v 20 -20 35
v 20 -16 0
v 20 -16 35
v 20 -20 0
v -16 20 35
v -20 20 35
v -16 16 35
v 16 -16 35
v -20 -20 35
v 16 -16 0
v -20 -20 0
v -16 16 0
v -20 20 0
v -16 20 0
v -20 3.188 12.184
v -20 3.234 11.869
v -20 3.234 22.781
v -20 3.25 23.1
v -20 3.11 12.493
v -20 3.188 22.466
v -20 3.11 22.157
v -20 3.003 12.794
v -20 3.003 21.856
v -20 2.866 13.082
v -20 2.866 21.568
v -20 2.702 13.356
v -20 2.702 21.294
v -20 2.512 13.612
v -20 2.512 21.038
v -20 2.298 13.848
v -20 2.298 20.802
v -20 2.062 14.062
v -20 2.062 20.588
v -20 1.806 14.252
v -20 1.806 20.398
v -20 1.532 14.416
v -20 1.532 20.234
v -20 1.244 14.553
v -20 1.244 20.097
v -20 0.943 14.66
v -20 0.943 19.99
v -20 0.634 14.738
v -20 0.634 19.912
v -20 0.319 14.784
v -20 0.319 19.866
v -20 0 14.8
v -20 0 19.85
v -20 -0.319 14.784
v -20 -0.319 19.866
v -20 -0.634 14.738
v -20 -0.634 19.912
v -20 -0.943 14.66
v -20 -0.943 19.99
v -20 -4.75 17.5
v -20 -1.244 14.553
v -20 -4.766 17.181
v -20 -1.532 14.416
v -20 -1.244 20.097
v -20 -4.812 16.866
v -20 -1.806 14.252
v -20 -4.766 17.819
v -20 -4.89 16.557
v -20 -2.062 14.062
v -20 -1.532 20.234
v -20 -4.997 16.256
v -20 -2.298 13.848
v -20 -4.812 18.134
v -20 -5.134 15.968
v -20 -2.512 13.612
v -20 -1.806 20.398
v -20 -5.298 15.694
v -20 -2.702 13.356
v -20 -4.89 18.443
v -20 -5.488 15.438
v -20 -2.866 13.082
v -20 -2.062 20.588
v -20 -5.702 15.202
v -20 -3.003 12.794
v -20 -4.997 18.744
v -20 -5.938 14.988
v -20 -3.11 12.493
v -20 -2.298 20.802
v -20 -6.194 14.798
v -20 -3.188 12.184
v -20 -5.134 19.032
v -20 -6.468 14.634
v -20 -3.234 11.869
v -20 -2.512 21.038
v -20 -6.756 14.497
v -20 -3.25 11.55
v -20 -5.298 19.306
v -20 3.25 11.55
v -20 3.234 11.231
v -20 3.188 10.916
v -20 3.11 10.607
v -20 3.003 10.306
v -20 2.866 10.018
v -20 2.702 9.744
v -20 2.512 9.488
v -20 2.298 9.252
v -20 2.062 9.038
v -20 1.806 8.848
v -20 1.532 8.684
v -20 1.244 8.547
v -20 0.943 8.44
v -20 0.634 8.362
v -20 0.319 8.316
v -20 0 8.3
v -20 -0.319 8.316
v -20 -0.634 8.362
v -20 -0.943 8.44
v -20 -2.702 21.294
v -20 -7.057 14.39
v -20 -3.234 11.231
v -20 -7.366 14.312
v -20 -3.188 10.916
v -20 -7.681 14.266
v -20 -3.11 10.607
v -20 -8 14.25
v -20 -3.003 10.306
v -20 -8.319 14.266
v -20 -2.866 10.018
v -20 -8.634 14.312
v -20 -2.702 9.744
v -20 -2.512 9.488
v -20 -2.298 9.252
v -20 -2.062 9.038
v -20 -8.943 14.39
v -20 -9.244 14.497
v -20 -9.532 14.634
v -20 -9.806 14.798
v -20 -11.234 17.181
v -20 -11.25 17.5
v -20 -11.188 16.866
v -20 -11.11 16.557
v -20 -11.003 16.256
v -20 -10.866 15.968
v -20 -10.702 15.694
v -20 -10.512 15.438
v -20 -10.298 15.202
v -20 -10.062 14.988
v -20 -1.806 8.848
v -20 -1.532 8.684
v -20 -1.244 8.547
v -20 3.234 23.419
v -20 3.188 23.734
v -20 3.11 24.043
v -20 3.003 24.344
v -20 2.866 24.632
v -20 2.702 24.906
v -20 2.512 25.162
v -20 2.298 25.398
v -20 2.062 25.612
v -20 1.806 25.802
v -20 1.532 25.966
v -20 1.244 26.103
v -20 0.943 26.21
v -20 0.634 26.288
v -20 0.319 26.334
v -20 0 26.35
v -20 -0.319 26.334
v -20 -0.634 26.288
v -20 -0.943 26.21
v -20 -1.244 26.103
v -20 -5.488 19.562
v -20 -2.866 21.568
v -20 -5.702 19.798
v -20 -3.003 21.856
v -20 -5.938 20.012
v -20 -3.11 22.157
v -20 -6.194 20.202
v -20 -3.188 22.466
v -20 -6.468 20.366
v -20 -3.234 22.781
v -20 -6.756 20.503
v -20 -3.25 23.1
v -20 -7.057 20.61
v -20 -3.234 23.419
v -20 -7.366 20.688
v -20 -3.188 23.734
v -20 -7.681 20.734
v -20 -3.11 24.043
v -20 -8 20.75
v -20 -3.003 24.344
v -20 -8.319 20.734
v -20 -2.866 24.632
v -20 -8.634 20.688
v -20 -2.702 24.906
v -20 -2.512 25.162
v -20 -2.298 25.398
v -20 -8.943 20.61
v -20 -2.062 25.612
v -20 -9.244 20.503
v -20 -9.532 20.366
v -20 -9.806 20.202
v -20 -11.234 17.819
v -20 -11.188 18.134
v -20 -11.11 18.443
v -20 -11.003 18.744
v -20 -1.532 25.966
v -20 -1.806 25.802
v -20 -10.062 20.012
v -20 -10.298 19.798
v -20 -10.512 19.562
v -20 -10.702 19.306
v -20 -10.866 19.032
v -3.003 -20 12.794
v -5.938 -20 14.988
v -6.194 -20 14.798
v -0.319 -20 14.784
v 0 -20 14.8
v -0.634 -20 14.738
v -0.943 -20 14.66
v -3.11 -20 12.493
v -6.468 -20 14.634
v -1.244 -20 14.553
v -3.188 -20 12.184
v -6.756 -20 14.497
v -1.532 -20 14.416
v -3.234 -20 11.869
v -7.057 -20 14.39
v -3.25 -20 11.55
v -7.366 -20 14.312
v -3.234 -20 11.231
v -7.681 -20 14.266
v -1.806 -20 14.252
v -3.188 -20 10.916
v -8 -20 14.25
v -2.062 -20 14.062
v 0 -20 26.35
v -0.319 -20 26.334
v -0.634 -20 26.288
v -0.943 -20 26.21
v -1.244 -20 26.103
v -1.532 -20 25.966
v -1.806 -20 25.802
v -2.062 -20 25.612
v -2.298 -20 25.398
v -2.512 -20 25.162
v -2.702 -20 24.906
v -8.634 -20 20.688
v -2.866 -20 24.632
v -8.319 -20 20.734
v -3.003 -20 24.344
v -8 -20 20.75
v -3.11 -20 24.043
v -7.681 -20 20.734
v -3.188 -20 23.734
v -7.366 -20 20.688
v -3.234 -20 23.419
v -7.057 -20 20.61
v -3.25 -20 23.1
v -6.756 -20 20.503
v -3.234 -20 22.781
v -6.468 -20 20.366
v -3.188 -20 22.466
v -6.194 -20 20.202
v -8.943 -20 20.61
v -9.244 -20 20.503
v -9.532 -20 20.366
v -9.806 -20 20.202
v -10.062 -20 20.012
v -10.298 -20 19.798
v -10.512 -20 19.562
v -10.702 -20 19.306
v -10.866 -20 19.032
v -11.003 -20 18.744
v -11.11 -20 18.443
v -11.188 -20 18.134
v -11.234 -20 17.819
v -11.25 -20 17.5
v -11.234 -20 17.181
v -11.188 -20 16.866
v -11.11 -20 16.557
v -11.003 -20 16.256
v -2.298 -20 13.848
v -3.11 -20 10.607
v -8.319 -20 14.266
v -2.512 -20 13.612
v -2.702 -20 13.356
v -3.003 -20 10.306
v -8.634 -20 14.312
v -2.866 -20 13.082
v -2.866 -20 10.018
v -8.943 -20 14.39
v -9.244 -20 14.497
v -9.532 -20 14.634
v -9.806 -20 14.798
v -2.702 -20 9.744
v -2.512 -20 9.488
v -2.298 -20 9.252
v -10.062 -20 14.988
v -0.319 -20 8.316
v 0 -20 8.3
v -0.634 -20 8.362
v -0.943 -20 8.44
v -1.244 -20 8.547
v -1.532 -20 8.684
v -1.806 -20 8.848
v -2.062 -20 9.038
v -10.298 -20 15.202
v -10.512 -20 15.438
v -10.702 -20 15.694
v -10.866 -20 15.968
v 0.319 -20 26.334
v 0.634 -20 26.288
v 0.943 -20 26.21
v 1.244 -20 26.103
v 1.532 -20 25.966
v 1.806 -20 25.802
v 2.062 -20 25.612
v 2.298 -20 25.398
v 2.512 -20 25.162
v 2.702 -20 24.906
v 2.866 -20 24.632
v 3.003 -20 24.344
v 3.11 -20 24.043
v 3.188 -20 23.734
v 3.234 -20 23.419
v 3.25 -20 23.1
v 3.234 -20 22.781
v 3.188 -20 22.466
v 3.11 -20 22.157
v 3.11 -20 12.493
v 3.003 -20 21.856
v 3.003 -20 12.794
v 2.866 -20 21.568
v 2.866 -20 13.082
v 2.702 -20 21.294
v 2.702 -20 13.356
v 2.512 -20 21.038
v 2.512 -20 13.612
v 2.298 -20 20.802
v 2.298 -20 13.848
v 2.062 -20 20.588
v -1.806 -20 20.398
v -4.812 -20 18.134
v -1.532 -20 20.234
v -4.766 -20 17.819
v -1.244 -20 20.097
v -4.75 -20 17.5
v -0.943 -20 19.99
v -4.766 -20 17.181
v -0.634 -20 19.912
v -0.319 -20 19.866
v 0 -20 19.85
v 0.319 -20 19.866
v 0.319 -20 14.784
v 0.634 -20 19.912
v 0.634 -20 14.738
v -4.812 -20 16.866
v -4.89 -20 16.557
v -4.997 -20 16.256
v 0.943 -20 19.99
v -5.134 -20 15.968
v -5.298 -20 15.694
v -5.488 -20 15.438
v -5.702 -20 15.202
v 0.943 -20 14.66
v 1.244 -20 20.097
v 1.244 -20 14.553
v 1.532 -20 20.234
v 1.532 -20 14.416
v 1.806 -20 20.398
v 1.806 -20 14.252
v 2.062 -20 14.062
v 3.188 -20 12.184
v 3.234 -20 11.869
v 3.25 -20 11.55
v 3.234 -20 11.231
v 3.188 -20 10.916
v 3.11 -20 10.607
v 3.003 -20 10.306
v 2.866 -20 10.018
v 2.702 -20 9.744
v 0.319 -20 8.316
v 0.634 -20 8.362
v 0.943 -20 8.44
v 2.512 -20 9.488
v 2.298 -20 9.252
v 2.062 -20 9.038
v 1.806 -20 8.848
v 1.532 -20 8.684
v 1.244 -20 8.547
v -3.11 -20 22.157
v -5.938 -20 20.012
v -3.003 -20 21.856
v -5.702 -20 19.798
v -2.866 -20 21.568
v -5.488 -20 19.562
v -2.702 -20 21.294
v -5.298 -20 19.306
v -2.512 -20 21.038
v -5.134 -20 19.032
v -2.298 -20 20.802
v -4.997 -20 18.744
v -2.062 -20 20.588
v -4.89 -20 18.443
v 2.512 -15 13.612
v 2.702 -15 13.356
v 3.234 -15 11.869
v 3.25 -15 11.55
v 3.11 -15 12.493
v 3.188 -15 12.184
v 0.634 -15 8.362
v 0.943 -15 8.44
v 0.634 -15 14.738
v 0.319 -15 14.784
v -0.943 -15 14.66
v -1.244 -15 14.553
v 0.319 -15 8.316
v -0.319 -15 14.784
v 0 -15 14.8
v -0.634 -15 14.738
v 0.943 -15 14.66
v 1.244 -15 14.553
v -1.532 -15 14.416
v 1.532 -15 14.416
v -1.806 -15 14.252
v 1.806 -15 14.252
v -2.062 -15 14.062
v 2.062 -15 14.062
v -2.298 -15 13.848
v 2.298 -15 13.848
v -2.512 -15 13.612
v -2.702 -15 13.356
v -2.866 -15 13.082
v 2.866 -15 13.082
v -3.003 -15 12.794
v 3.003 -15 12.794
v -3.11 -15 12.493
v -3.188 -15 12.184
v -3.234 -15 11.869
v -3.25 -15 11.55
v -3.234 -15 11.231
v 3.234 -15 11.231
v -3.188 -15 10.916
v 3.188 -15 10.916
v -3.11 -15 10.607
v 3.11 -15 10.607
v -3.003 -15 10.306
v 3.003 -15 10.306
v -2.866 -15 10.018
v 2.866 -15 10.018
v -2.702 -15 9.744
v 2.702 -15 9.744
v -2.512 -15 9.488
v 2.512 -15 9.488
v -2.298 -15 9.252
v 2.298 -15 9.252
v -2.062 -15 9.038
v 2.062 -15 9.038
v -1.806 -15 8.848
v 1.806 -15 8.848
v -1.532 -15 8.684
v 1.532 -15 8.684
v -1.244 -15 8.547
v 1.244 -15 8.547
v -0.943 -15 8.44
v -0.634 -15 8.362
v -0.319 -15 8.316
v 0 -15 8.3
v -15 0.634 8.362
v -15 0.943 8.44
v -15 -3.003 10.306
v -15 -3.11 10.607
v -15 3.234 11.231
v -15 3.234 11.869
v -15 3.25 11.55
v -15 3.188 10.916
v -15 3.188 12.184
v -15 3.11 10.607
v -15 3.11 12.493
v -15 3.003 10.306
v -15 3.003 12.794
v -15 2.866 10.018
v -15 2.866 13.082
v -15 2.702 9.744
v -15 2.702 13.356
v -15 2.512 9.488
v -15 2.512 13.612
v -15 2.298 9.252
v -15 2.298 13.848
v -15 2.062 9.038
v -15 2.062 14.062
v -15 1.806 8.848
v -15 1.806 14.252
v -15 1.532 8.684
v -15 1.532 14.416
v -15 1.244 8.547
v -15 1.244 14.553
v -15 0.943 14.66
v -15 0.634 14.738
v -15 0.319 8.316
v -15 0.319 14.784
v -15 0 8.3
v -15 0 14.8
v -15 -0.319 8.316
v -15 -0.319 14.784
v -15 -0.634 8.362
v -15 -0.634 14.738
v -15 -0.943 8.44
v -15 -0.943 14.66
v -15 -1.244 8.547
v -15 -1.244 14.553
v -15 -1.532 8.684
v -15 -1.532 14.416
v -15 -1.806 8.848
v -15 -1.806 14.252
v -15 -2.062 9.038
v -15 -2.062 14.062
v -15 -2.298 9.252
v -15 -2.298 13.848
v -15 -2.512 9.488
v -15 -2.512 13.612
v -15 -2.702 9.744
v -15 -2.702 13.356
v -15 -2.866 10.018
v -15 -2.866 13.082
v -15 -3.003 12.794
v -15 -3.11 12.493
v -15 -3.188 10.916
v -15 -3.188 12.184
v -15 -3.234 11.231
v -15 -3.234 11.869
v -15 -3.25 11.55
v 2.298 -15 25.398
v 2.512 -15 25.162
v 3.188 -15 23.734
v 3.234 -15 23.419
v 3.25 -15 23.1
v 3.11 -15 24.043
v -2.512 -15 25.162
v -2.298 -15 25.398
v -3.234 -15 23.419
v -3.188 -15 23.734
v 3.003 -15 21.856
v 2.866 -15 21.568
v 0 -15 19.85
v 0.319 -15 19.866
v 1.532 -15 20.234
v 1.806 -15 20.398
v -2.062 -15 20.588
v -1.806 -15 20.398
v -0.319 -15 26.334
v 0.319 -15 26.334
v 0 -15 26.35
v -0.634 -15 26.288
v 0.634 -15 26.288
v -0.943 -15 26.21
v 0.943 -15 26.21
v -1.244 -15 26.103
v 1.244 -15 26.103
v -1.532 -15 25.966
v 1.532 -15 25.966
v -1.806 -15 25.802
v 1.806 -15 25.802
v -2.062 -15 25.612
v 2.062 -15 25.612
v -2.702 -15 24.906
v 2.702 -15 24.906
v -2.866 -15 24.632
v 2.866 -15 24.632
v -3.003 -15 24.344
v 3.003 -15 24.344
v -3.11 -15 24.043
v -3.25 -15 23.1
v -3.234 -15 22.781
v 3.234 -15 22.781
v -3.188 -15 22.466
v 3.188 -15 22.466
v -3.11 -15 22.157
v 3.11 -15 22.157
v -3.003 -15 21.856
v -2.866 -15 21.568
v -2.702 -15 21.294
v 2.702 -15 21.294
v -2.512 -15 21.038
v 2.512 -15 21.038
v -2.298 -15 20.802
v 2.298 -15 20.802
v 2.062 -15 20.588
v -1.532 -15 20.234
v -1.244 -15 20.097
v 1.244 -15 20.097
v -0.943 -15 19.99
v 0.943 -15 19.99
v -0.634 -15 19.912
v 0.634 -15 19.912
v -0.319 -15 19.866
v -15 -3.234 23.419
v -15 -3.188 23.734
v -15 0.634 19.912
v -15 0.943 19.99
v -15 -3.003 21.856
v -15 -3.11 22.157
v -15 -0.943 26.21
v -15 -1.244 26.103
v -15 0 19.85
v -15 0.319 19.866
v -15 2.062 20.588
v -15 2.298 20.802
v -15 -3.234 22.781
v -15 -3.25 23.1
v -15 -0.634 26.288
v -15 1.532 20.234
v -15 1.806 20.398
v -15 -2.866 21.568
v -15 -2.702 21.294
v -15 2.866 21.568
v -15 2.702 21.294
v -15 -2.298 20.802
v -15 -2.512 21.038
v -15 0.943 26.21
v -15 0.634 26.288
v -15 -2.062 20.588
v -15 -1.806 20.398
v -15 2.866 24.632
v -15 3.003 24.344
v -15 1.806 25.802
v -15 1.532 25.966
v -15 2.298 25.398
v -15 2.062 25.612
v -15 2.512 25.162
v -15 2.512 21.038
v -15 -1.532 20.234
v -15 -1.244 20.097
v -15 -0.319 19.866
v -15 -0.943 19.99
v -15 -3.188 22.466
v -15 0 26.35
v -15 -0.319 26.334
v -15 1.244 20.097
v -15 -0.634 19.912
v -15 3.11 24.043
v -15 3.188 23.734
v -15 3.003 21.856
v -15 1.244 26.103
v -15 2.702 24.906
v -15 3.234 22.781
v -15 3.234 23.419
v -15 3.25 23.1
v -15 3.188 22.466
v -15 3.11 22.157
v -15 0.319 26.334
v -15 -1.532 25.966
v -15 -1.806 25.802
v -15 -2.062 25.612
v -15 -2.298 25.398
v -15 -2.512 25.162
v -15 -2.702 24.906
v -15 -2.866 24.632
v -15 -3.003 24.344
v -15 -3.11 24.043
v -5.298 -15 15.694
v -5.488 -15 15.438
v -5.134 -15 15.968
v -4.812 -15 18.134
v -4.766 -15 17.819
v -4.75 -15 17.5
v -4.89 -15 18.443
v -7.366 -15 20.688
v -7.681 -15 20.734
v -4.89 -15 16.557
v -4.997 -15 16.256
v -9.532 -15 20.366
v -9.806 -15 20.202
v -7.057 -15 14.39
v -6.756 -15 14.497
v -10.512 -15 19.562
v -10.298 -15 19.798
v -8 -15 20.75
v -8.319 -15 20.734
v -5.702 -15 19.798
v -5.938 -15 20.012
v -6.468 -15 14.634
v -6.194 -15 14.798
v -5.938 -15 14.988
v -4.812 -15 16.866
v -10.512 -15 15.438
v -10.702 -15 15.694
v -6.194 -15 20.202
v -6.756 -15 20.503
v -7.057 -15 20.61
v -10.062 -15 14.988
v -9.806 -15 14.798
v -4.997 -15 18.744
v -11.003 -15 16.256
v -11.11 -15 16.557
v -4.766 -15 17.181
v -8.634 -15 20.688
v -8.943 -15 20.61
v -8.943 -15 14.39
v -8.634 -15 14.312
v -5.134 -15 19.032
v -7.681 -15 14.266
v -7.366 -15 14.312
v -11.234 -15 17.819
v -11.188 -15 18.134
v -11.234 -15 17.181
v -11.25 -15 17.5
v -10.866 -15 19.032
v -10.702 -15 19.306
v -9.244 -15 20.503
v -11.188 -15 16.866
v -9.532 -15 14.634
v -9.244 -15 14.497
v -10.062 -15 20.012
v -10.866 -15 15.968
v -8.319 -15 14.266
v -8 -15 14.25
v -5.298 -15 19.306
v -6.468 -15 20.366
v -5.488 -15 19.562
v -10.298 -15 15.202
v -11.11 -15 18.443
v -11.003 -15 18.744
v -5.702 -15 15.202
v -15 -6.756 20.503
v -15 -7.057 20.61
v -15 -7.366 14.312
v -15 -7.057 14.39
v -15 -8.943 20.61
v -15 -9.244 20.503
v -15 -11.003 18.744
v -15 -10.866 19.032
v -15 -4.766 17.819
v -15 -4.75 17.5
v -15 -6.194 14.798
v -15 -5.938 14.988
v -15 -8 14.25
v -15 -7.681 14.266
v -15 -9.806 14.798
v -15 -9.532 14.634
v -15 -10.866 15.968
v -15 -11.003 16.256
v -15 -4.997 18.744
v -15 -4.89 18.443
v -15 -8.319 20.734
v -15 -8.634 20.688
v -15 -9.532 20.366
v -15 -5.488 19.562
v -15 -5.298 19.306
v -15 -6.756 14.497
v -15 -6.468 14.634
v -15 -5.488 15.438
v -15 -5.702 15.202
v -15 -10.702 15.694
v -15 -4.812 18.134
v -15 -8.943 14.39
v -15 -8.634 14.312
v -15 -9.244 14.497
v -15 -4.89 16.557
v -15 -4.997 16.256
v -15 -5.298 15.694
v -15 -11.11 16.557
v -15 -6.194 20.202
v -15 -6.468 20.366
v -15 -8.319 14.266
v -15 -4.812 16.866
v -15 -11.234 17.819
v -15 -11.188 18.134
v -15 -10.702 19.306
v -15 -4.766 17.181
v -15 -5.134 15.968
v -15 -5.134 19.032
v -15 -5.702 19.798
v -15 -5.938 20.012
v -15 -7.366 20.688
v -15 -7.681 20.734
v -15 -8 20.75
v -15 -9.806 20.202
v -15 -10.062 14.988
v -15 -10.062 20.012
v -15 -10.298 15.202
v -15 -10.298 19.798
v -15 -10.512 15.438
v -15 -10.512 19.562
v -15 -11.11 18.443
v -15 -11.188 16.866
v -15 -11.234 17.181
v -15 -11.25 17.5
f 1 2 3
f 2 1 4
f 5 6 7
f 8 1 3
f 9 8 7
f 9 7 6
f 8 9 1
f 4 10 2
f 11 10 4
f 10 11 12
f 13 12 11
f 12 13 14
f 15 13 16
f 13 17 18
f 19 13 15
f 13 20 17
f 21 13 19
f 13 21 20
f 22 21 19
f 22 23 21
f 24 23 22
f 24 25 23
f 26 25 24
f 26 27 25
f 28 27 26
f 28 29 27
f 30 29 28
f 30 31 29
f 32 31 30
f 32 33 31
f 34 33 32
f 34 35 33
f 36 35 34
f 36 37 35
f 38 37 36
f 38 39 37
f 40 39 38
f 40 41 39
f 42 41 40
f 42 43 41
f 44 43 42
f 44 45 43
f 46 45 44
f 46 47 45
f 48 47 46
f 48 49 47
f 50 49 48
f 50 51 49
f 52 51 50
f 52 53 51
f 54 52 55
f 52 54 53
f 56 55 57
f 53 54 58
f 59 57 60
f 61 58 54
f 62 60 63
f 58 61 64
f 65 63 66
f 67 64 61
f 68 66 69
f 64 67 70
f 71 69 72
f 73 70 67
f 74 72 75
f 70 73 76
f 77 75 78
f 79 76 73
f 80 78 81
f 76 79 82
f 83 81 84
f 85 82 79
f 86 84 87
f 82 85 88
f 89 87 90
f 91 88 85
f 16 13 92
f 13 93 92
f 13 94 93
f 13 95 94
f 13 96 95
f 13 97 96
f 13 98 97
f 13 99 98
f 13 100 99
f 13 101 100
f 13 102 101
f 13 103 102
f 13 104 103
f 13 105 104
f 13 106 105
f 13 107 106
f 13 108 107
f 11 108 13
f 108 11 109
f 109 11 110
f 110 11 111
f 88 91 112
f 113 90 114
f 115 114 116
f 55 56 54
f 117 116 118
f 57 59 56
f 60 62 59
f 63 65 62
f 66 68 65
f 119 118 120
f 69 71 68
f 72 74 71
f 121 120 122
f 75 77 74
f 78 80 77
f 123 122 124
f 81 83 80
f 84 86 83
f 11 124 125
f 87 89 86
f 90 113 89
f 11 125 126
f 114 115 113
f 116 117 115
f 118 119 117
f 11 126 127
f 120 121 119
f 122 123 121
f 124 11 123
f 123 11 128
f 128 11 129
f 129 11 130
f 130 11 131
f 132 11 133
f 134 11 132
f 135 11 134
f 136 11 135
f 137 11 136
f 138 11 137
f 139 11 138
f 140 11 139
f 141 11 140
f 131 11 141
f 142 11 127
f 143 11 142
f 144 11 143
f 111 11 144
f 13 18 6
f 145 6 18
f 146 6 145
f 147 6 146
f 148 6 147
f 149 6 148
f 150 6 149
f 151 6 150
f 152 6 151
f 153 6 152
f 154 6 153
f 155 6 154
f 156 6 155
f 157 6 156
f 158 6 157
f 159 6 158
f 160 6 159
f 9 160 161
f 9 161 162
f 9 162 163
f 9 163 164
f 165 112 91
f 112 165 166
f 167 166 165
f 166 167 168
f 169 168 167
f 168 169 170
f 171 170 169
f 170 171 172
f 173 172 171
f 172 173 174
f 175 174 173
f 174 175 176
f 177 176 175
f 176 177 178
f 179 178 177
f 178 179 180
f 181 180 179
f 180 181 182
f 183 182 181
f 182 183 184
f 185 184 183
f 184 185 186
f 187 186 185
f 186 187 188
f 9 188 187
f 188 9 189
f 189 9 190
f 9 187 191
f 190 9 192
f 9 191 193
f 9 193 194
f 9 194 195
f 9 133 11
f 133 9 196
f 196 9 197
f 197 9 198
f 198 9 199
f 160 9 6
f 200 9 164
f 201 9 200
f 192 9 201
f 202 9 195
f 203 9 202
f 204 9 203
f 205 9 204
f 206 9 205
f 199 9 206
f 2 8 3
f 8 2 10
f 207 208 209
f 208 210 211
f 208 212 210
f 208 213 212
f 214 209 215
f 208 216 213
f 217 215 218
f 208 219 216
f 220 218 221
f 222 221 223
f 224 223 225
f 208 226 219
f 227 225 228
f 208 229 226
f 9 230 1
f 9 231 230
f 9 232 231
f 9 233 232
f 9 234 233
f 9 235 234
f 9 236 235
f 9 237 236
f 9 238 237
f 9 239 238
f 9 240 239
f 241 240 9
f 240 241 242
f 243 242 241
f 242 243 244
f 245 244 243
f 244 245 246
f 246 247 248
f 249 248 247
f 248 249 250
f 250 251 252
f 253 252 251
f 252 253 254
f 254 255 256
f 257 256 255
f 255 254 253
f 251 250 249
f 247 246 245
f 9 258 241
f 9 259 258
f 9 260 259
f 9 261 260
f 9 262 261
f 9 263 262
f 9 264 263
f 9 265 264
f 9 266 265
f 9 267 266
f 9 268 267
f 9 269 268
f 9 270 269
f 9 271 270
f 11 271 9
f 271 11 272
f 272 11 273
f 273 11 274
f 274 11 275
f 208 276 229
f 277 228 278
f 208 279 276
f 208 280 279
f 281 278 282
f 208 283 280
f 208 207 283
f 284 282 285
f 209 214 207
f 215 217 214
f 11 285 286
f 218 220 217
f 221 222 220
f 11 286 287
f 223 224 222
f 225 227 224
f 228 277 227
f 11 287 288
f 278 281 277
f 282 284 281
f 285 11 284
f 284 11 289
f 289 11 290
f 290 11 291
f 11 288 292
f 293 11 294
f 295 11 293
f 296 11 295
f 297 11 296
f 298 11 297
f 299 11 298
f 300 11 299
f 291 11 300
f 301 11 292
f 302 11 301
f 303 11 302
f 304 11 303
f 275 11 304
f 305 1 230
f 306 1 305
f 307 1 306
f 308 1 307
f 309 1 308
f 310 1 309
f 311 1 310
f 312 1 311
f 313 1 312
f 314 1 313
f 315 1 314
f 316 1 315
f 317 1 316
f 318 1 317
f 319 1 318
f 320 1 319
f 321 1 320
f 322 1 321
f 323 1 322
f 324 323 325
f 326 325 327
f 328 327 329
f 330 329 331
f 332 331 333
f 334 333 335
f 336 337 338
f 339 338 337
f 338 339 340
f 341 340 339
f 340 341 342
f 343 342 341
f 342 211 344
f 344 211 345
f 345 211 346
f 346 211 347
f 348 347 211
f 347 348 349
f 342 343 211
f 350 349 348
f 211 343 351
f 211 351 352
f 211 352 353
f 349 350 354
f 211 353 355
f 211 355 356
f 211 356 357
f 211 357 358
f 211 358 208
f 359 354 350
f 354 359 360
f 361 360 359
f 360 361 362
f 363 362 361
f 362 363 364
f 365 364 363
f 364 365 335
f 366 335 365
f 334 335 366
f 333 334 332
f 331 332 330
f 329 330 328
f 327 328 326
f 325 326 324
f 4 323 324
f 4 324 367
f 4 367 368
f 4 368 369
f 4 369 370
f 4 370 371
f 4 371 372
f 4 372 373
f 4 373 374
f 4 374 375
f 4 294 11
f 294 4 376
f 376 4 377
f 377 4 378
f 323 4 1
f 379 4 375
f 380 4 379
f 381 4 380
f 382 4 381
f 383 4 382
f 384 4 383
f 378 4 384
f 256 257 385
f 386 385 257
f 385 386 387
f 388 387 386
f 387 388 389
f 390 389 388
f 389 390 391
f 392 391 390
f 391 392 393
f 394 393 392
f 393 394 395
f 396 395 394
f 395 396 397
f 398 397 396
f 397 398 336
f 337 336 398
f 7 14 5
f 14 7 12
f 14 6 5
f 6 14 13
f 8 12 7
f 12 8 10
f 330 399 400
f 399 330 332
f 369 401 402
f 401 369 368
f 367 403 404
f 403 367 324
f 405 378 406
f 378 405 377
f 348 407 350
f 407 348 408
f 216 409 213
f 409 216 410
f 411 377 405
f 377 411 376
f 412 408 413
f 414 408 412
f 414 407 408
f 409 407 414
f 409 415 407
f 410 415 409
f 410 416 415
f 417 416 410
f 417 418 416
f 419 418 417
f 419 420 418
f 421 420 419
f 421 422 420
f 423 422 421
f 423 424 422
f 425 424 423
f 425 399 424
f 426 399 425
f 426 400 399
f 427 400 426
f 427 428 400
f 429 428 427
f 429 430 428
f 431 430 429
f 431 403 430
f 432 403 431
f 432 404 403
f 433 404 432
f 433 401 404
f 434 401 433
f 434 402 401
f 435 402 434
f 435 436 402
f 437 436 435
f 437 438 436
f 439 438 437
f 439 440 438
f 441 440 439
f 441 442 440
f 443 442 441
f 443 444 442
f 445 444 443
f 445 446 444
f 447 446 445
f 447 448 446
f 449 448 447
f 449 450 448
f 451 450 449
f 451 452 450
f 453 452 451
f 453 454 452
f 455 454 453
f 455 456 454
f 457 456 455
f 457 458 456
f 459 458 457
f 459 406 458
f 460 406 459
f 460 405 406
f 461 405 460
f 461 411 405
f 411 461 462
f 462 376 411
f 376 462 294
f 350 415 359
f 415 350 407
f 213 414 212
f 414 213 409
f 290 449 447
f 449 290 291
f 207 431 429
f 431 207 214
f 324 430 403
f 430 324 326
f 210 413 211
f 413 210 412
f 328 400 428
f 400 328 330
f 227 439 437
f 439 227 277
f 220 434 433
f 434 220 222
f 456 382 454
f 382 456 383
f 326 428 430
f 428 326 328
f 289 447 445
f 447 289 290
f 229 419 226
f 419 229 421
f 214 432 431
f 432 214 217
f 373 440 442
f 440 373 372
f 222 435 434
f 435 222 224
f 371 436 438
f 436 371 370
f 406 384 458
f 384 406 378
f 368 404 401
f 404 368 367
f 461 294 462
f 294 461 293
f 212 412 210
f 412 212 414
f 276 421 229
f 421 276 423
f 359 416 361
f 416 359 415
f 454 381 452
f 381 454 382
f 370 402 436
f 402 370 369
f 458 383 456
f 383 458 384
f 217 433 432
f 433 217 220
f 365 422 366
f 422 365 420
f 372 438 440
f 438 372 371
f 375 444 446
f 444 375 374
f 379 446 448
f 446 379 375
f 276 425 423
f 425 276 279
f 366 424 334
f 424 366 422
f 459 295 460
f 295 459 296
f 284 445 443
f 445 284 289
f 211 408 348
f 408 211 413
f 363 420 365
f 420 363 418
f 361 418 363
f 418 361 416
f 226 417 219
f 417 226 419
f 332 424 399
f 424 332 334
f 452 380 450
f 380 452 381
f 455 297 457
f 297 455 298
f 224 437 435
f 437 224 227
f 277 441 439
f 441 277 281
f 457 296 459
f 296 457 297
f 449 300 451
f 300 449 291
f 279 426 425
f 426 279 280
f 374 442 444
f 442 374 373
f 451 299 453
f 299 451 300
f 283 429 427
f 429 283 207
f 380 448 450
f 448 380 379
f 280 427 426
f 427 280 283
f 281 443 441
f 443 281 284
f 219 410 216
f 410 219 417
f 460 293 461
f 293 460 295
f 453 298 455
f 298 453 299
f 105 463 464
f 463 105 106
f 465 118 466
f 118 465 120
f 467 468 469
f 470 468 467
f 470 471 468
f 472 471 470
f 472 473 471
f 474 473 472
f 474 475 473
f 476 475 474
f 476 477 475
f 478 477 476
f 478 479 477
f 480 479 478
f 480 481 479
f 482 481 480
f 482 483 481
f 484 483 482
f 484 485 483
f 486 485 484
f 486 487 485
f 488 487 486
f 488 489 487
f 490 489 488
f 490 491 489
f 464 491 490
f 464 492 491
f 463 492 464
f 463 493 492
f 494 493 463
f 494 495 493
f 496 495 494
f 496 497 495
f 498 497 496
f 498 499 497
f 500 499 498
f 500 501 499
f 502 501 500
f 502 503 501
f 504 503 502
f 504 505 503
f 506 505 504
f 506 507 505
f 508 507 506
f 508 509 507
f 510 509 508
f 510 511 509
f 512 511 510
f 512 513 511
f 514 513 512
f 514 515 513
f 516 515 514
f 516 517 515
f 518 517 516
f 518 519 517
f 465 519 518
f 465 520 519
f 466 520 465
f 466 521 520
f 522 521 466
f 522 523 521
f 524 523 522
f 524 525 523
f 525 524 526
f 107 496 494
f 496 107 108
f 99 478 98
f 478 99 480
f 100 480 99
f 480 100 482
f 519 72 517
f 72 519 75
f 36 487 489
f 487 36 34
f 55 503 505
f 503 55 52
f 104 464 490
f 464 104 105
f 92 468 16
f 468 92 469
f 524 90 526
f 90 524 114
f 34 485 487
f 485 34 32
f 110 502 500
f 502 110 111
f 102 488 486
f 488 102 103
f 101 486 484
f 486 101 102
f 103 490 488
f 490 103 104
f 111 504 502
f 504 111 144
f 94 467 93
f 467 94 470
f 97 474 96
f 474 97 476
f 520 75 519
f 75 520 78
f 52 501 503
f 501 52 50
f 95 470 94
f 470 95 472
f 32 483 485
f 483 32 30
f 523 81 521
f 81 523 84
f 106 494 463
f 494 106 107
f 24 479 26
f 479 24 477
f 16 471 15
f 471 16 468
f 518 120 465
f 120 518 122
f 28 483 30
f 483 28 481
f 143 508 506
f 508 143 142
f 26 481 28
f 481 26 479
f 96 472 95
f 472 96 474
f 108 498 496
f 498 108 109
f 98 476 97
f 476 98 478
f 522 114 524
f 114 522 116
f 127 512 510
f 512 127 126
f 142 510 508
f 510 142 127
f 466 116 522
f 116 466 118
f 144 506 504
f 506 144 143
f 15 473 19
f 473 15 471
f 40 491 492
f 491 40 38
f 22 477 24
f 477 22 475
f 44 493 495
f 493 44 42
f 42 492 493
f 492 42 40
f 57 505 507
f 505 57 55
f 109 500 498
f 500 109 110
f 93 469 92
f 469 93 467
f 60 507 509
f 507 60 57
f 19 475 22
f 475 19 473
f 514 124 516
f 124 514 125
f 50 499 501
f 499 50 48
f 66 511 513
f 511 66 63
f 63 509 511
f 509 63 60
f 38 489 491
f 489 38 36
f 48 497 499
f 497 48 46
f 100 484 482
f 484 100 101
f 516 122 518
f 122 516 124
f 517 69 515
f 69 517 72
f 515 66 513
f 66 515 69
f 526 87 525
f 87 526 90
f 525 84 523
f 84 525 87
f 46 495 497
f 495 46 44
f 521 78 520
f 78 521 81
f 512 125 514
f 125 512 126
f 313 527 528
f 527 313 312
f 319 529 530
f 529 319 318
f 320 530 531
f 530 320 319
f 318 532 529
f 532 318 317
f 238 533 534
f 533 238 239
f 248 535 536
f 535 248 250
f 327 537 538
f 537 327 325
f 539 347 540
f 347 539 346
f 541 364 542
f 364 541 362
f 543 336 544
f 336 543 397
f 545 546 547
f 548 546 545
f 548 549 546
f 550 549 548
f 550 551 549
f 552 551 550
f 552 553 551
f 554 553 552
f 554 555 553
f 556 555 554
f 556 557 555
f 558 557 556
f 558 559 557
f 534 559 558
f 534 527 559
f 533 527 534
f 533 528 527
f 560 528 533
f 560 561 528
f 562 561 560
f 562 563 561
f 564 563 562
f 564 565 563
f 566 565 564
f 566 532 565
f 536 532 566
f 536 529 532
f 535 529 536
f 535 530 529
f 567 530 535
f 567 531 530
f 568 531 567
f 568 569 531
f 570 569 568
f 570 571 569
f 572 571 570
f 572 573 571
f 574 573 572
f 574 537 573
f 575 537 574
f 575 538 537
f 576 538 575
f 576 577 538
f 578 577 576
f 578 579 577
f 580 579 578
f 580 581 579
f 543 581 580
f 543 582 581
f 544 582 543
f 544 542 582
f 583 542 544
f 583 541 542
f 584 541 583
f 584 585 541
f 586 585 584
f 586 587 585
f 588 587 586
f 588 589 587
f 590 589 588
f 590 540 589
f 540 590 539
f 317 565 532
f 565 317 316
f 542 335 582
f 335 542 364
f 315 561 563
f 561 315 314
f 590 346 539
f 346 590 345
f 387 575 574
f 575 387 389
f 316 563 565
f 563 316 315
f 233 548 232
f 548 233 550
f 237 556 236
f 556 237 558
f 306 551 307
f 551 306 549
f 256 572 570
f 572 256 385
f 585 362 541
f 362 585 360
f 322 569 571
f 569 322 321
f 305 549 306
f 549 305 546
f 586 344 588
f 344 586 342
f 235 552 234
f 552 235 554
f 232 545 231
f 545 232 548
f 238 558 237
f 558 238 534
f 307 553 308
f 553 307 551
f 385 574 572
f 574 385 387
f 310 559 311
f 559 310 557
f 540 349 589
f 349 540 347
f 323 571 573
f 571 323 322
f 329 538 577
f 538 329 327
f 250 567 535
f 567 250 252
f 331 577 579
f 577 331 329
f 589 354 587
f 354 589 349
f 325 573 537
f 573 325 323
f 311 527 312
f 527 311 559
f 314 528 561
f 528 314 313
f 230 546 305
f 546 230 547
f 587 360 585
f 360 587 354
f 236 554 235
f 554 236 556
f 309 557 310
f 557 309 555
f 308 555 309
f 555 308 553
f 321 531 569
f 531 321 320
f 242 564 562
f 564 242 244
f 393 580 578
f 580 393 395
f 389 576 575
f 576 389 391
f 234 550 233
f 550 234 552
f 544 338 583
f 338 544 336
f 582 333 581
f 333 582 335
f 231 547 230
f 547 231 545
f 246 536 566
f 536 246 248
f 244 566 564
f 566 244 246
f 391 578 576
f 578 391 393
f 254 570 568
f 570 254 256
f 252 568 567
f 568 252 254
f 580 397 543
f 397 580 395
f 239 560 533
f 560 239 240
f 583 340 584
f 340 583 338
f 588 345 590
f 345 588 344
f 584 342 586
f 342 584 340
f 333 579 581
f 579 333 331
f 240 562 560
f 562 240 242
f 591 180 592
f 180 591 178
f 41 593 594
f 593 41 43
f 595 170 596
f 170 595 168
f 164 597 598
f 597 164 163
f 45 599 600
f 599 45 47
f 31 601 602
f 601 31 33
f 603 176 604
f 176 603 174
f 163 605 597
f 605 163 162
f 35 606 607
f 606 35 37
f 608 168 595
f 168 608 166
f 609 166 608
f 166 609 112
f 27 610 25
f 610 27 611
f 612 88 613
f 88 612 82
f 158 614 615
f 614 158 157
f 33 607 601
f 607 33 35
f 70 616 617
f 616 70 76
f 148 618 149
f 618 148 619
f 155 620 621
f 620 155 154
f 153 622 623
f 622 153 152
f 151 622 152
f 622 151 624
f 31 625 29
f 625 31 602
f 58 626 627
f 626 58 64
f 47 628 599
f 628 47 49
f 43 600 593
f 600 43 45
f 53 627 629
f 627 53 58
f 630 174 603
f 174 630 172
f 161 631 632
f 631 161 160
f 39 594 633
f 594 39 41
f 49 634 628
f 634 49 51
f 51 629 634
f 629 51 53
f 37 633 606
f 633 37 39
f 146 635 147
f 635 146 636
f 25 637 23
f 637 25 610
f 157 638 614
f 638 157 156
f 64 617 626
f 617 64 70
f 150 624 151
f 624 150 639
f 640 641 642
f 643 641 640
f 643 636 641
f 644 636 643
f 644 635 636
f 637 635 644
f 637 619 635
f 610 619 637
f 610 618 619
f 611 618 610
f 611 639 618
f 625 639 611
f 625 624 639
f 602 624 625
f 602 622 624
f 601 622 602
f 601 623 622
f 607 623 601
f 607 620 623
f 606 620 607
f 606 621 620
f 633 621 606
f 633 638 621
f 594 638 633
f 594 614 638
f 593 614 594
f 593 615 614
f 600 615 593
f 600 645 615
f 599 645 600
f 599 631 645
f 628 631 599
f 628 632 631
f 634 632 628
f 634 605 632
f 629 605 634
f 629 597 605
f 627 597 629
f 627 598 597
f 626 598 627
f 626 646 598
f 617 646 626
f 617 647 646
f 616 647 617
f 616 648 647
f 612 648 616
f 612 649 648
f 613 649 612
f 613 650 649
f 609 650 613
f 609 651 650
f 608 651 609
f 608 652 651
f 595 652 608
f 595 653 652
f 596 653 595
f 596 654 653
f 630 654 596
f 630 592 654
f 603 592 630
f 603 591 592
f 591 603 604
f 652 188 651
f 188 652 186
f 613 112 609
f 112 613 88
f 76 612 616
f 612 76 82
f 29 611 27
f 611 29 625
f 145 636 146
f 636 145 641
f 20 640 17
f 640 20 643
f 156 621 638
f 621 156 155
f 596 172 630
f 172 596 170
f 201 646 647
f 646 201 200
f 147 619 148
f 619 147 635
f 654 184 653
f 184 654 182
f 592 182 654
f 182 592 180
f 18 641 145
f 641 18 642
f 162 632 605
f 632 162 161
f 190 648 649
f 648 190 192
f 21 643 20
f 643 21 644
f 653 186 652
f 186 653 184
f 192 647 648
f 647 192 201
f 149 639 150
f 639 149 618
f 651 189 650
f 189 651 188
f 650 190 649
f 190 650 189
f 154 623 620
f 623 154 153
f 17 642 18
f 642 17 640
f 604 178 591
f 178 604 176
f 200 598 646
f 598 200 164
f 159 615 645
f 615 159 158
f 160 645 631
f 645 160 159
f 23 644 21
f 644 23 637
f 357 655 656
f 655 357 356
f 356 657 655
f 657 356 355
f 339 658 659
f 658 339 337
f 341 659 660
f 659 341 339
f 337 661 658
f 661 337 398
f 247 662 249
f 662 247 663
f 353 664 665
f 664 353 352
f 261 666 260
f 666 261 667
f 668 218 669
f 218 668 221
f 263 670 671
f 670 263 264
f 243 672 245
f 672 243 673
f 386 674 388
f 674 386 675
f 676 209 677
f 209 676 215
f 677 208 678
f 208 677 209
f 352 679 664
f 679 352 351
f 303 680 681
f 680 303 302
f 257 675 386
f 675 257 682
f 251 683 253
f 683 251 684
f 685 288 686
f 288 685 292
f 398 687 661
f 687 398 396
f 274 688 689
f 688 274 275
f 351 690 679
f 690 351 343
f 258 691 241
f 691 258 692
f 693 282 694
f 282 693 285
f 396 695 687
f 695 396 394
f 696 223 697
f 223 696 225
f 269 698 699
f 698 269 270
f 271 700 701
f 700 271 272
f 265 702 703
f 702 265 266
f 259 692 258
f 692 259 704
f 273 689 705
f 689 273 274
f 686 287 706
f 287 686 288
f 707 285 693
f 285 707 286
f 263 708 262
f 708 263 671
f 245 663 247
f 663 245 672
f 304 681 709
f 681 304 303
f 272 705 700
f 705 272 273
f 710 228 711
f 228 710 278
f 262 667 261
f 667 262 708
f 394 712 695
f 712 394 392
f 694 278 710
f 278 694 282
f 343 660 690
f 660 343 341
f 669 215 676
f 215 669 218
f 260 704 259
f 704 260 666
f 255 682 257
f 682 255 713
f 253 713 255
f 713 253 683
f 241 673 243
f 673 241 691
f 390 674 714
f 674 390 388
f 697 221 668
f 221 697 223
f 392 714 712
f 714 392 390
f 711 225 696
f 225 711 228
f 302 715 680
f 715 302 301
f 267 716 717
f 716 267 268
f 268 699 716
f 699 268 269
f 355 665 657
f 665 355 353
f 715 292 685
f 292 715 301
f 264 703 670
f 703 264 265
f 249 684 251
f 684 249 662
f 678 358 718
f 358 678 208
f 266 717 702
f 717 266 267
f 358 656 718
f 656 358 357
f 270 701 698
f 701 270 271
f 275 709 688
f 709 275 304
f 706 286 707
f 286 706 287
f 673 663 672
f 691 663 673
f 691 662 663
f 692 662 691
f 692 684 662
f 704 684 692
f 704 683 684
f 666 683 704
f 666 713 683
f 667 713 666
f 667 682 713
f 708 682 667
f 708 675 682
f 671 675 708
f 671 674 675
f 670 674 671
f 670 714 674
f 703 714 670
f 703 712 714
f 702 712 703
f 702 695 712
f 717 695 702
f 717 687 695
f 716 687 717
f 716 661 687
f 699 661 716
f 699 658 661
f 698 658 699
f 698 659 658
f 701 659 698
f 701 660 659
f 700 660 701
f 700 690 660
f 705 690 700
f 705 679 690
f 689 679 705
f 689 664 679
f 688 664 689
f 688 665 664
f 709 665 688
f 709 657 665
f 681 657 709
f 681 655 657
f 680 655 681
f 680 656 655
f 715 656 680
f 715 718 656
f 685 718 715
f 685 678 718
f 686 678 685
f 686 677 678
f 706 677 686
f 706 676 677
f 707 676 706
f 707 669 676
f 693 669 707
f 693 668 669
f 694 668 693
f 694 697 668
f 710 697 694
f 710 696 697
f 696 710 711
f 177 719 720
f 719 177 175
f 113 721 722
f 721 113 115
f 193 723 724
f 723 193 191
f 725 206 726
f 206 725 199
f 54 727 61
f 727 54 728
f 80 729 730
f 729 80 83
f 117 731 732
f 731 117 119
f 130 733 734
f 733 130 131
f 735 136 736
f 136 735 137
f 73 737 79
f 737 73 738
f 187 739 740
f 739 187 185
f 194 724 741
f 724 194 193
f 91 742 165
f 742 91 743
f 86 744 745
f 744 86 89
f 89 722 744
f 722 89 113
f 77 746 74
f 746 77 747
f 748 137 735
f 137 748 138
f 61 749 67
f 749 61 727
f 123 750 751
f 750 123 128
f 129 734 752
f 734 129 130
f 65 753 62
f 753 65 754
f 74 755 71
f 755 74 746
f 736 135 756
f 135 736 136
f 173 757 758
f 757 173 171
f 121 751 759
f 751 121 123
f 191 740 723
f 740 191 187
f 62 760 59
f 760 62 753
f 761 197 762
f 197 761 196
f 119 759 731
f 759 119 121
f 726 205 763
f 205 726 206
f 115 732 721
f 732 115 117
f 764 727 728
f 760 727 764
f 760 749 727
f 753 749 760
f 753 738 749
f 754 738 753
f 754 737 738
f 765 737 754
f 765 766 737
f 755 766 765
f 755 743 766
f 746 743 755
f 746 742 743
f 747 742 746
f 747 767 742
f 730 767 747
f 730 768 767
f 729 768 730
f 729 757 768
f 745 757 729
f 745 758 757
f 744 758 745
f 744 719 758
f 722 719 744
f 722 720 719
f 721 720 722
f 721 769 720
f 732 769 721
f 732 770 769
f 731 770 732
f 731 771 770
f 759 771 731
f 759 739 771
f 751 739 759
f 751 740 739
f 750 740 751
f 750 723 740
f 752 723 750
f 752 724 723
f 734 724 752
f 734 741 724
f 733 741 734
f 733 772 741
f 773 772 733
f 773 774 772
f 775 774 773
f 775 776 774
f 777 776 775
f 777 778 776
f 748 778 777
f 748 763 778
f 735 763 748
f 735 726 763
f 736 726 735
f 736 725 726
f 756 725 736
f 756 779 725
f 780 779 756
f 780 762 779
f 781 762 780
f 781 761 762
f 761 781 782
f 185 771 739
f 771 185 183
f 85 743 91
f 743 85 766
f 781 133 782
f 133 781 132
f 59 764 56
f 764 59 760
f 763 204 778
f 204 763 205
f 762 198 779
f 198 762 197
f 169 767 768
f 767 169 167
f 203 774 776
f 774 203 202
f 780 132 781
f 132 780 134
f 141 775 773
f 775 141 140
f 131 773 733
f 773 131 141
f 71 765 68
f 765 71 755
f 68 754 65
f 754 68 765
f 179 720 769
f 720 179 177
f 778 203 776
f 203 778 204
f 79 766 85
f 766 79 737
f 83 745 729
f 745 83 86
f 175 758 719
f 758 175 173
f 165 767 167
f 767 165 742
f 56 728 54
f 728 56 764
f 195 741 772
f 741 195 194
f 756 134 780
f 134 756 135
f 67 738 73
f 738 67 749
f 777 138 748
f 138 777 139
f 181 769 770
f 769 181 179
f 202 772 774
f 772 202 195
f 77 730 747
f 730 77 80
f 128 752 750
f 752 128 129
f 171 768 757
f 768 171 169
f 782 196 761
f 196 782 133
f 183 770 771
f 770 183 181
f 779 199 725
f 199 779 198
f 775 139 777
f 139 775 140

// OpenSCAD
$fn=64;

size = [40,40,35];

module extrusion_bracket(sz=[40,40,35], wall=4, rib=4, hole_d=6.5, hole_offset=12) {
    x=sz[0]; y=sz[1]; z=sz[2];

    difference() {
        union() {
            translate([-x/2, -y/2, 0]) cube([x, wall, z], center=false);
            translate([-x/2, -y/2, 0]) cube([wall, y, z], center=false);

            translate([-x/2, -y/2, 0])
                linear_extrude(height=z)
                    polygon(points=[[0,0],[x,0],[0,y]]);
            
            translate([-x/2, -y/2, 0])
                linear_extrude(height=z)
                    polygon(points=[[0,0],[x,0],[x,wall],[wall,wall],[wall,y],[0,y]]);
        }

        for (zz = [z*0.33, z*0.66]) {
            translate([0, -y/2 + wall/2, zz])
                rotate([90,0,0])
                    cylinder(h=wall+2, d=hole_d, center=true);

            translate([-x/2 + wall/2, 0, zz])
                rotate([0,90,0])
                    cylinder(h=wall+2, d=hole_d, center=true);
        }

        translate([hole_offset - x/2, -y/2 + wall/2, z/2])
            rotate([90,0,0])
                cylinder(h=wall+2, d=hole_d, center=true);

        translate([-x/2 + wall/2, hole_offset - y/2, z/2])
            rotate([0,90,0])
                cylinder(h=wall+2, d=hole_d, center=true);
    }
}

extrusion_bracket(size);
